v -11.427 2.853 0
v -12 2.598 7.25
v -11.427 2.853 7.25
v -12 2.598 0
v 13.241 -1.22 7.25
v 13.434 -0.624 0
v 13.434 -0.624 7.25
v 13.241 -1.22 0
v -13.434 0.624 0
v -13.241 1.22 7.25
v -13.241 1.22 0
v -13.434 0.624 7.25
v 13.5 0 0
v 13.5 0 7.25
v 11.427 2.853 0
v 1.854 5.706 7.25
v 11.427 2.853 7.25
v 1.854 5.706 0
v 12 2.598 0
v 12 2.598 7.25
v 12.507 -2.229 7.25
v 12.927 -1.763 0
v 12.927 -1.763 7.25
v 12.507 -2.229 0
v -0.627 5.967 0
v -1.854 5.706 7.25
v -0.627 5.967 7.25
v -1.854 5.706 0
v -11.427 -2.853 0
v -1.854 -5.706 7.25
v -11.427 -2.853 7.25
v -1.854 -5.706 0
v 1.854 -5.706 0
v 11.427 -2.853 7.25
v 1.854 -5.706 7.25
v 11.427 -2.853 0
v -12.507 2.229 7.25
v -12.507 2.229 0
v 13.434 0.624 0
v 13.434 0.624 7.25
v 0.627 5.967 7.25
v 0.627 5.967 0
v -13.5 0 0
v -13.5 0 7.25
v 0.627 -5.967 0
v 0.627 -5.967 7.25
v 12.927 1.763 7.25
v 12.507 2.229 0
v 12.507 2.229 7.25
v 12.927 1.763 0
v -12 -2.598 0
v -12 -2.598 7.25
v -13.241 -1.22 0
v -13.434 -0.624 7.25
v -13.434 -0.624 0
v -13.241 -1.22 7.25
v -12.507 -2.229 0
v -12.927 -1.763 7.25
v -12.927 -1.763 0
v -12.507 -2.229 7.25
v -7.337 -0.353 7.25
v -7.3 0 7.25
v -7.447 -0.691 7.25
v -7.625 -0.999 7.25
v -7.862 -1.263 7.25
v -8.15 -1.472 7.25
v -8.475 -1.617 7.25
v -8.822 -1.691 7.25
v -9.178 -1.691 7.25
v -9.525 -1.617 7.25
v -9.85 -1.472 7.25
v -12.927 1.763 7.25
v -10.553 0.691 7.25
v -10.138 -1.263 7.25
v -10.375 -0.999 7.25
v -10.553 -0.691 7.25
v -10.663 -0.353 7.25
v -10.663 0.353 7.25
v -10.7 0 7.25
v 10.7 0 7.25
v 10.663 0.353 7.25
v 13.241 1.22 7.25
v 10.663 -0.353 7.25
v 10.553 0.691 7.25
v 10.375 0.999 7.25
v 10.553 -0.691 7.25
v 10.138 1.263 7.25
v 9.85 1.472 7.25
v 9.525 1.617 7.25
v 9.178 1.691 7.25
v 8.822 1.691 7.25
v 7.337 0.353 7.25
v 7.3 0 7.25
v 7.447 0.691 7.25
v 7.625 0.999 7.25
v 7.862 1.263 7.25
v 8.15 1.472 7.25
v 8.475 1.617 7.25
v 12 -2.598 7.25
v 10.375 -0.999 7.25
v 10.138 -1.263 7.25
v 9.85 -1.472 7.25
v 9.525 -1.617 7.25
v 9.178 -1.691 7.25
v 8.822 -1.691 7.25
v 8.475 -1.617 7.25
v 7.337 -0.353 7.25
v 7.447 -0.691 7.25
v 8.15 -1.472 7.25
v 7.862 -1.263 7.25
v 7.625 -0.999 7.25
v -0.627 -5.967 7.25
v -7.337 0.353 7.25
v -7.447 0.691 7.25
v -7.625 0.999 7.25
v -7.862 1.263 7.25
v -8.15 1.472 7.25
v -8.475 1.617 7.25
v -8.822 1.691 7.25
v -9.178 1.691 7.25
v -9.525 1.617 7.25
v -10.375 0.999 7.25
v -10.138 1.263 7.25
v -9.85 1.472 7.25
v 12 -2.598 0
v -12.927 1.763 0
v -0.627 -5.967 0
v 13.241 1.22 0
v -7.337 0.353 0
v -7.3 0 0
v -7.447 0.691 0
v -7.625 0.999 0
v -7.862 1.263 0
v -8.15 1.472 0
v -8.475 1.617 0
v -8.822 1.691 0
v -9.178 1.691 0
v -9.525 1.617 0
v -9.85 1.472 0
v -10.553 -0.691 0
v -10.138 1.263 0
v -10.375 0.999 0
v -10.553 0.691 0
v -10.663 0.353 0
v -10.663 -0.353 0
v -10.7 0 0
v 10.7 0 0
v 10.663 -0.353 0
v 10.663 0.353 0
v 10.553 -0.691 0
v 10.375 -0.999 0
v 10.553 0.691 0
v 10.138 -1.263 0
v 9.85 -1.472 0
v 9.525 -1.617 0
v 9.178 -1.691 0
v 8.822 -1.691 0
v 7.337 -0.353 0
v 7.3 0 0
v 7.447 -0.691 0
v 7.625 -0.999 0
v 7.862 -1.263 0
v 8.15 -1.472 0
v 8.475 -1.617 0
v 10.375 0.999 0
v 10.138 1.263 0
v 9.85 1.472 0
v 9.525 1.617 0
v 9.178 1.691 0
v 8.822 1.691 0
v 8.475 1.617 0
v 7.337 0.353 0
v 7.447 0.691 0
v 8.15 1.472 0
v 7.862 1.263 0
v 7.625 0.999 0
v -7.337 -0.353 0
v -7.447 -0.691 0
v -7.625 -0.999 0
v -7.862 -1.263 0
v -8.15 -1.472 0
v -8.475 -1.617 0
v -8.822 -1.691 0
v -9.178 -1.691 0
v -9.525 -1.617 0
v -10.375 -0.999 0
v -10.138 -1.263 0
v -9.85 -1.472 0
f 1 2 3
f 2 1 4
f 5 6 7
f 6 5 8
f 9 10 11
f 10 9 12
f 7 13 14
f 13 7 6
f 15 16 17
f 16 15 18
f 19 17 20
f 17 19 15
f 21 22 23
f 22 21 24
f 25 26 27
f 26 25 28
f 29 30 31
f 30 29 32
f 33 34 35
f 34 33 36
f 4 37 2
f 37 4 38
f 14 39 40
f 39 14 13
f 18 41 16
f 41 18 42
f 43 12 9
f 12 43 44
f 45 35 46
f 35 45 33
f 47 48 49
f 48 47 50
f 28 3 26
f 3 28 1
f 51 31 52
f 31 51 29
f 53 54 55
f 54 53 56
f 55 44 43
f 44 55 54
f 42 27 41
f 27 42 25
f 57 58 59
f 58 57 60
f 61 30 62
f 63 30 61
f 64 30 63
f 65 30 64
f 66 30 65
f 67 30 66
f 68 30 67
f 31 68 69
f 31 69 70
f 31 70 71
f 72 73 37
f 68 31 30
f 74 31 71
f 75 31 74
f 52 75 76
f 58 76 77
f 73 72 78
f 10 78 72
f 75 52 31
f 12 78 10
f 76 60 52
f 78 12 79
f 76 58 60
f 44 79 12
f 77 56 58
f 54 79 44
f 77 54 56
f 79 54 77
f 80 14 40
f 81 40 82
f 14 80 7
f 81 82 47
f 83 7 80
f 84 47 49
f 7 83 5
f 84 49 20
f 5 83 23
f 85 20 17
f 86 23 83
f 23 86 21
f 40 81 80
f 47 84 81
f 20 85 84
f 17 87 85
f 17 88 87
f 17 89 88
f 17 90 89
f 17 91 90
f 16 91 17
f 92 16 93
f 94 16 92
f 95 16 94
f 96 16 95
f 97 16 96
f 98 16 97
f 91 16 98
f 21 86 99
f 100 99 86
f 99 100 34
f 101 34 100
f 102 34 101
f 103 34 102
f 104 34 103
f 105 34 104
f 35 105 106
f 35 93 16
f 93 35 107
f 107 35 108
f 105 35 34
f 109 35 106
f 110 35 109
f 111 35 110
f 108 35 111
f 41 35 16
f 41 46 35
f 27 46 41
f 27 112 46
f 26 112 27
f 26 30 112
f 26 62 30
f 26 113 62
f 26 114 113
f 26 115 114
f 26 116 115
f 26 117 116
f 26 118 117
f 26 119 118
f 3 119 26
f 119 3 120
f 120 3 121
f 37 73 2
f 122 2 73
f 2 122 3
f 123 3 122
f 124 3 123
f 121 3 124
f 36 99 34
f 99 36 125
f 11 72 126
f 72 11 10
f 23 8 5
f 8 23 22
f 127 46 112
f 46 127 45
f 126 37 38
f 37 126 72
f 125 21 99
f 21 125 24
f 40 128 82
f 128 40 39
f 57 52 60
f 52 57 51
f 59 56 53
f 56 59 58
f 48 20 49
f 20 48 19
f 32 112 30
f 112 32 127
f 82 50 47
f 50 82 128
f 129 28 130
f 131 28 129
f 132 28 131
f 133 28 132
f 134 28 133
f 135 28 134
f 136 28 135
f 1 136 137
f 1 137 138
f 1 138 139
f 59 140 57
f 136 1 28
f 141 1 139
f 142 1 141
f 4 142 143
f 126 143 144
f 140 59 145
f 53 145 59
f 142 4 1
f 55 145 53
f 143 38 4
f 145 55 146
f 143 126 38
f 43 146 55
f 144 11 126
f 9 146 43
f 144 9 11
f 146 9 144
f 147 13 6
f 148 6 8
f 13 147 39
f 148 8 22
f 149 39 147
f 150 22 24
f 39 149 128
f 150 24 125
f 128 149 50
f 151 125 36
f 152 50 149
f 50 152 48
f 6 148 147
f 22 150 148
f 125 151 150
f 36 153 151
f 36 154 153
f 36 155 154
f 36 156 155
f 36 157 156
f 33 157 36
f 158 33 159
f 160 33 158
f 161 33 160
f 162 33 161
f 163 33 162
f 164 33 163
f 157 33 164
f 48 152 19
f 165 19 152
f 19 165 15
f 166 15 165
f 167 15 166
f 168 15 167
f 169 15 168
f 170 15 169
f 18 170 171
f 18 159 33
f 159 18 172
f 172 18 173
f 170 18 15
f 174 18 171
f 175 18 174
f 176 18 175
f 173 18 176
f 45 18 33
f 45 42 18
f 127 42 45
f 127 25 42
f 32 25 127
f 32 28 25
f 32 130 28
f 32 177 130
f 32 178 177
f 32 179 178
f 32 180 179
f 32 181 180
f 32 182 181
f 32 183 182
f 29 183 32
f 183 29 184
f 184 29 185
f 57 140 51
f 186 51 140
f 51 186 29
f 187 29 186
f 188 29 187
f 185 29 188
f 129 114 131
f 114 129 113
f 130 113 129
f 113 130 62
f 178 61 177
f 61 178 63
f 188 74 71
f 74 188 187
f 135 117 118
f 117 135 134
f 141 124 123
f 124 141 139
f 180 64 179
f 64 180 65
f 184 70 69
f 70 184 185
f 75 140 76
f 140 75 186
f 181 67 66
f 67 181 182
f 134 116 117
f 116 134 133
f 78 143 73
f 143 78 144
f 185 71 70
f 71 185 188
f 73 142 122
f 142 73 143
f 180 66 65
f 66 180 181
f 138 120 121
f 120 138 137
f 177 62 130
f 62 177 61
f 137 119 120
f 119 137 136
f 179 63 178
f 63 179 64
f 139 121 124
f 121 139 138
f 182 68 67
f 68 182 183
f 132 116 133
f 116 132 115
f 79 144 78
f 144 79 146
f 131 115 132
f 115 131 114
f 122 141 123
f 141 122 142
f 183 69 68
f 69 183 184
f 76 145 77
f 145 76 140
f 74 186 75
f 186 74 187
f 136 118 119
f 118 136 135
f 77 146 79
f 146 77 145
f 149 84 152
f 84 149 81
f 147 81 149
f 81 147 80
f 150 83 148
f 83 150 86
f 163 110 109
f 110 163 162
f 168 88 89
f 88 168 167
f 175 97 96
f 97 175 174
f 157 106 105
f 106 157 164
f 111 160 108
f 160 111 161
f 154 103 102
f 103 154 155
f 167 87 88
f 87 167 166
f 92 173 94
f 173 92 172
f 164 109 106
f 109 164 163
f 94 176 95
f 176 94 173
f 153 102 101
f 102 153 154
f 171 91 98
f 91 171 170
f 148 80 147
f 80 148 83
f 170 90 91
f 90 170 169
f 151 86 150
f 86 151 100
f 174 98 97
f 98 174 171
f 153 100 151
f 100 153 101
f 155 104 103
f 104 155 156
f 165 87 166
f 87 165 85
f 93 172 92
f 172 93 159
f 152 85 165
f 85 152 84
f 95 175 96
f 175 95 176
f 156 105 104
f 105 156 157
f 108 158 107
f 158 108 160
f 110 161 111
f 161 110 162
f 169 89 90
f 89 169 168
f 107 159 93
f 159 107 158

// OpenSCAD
 
difference() {
   hull() {
    translate([-10.5,0,0]) cylinder(d=6,h=7.25,$fn=30);
    translate([0,0,0]) cylinder(d=12,h=7.25,$fn=30);
    translate([10.5,0,0]) cylinder(d=6,h=7.25,$fn=30);
    }
translate([-9,0,0]) cylinder(d=3.4,h=7.25,$fn=30);
translate([9,0,0]) cylinder(d=3.4,h=7.25,$fn=30);
}
